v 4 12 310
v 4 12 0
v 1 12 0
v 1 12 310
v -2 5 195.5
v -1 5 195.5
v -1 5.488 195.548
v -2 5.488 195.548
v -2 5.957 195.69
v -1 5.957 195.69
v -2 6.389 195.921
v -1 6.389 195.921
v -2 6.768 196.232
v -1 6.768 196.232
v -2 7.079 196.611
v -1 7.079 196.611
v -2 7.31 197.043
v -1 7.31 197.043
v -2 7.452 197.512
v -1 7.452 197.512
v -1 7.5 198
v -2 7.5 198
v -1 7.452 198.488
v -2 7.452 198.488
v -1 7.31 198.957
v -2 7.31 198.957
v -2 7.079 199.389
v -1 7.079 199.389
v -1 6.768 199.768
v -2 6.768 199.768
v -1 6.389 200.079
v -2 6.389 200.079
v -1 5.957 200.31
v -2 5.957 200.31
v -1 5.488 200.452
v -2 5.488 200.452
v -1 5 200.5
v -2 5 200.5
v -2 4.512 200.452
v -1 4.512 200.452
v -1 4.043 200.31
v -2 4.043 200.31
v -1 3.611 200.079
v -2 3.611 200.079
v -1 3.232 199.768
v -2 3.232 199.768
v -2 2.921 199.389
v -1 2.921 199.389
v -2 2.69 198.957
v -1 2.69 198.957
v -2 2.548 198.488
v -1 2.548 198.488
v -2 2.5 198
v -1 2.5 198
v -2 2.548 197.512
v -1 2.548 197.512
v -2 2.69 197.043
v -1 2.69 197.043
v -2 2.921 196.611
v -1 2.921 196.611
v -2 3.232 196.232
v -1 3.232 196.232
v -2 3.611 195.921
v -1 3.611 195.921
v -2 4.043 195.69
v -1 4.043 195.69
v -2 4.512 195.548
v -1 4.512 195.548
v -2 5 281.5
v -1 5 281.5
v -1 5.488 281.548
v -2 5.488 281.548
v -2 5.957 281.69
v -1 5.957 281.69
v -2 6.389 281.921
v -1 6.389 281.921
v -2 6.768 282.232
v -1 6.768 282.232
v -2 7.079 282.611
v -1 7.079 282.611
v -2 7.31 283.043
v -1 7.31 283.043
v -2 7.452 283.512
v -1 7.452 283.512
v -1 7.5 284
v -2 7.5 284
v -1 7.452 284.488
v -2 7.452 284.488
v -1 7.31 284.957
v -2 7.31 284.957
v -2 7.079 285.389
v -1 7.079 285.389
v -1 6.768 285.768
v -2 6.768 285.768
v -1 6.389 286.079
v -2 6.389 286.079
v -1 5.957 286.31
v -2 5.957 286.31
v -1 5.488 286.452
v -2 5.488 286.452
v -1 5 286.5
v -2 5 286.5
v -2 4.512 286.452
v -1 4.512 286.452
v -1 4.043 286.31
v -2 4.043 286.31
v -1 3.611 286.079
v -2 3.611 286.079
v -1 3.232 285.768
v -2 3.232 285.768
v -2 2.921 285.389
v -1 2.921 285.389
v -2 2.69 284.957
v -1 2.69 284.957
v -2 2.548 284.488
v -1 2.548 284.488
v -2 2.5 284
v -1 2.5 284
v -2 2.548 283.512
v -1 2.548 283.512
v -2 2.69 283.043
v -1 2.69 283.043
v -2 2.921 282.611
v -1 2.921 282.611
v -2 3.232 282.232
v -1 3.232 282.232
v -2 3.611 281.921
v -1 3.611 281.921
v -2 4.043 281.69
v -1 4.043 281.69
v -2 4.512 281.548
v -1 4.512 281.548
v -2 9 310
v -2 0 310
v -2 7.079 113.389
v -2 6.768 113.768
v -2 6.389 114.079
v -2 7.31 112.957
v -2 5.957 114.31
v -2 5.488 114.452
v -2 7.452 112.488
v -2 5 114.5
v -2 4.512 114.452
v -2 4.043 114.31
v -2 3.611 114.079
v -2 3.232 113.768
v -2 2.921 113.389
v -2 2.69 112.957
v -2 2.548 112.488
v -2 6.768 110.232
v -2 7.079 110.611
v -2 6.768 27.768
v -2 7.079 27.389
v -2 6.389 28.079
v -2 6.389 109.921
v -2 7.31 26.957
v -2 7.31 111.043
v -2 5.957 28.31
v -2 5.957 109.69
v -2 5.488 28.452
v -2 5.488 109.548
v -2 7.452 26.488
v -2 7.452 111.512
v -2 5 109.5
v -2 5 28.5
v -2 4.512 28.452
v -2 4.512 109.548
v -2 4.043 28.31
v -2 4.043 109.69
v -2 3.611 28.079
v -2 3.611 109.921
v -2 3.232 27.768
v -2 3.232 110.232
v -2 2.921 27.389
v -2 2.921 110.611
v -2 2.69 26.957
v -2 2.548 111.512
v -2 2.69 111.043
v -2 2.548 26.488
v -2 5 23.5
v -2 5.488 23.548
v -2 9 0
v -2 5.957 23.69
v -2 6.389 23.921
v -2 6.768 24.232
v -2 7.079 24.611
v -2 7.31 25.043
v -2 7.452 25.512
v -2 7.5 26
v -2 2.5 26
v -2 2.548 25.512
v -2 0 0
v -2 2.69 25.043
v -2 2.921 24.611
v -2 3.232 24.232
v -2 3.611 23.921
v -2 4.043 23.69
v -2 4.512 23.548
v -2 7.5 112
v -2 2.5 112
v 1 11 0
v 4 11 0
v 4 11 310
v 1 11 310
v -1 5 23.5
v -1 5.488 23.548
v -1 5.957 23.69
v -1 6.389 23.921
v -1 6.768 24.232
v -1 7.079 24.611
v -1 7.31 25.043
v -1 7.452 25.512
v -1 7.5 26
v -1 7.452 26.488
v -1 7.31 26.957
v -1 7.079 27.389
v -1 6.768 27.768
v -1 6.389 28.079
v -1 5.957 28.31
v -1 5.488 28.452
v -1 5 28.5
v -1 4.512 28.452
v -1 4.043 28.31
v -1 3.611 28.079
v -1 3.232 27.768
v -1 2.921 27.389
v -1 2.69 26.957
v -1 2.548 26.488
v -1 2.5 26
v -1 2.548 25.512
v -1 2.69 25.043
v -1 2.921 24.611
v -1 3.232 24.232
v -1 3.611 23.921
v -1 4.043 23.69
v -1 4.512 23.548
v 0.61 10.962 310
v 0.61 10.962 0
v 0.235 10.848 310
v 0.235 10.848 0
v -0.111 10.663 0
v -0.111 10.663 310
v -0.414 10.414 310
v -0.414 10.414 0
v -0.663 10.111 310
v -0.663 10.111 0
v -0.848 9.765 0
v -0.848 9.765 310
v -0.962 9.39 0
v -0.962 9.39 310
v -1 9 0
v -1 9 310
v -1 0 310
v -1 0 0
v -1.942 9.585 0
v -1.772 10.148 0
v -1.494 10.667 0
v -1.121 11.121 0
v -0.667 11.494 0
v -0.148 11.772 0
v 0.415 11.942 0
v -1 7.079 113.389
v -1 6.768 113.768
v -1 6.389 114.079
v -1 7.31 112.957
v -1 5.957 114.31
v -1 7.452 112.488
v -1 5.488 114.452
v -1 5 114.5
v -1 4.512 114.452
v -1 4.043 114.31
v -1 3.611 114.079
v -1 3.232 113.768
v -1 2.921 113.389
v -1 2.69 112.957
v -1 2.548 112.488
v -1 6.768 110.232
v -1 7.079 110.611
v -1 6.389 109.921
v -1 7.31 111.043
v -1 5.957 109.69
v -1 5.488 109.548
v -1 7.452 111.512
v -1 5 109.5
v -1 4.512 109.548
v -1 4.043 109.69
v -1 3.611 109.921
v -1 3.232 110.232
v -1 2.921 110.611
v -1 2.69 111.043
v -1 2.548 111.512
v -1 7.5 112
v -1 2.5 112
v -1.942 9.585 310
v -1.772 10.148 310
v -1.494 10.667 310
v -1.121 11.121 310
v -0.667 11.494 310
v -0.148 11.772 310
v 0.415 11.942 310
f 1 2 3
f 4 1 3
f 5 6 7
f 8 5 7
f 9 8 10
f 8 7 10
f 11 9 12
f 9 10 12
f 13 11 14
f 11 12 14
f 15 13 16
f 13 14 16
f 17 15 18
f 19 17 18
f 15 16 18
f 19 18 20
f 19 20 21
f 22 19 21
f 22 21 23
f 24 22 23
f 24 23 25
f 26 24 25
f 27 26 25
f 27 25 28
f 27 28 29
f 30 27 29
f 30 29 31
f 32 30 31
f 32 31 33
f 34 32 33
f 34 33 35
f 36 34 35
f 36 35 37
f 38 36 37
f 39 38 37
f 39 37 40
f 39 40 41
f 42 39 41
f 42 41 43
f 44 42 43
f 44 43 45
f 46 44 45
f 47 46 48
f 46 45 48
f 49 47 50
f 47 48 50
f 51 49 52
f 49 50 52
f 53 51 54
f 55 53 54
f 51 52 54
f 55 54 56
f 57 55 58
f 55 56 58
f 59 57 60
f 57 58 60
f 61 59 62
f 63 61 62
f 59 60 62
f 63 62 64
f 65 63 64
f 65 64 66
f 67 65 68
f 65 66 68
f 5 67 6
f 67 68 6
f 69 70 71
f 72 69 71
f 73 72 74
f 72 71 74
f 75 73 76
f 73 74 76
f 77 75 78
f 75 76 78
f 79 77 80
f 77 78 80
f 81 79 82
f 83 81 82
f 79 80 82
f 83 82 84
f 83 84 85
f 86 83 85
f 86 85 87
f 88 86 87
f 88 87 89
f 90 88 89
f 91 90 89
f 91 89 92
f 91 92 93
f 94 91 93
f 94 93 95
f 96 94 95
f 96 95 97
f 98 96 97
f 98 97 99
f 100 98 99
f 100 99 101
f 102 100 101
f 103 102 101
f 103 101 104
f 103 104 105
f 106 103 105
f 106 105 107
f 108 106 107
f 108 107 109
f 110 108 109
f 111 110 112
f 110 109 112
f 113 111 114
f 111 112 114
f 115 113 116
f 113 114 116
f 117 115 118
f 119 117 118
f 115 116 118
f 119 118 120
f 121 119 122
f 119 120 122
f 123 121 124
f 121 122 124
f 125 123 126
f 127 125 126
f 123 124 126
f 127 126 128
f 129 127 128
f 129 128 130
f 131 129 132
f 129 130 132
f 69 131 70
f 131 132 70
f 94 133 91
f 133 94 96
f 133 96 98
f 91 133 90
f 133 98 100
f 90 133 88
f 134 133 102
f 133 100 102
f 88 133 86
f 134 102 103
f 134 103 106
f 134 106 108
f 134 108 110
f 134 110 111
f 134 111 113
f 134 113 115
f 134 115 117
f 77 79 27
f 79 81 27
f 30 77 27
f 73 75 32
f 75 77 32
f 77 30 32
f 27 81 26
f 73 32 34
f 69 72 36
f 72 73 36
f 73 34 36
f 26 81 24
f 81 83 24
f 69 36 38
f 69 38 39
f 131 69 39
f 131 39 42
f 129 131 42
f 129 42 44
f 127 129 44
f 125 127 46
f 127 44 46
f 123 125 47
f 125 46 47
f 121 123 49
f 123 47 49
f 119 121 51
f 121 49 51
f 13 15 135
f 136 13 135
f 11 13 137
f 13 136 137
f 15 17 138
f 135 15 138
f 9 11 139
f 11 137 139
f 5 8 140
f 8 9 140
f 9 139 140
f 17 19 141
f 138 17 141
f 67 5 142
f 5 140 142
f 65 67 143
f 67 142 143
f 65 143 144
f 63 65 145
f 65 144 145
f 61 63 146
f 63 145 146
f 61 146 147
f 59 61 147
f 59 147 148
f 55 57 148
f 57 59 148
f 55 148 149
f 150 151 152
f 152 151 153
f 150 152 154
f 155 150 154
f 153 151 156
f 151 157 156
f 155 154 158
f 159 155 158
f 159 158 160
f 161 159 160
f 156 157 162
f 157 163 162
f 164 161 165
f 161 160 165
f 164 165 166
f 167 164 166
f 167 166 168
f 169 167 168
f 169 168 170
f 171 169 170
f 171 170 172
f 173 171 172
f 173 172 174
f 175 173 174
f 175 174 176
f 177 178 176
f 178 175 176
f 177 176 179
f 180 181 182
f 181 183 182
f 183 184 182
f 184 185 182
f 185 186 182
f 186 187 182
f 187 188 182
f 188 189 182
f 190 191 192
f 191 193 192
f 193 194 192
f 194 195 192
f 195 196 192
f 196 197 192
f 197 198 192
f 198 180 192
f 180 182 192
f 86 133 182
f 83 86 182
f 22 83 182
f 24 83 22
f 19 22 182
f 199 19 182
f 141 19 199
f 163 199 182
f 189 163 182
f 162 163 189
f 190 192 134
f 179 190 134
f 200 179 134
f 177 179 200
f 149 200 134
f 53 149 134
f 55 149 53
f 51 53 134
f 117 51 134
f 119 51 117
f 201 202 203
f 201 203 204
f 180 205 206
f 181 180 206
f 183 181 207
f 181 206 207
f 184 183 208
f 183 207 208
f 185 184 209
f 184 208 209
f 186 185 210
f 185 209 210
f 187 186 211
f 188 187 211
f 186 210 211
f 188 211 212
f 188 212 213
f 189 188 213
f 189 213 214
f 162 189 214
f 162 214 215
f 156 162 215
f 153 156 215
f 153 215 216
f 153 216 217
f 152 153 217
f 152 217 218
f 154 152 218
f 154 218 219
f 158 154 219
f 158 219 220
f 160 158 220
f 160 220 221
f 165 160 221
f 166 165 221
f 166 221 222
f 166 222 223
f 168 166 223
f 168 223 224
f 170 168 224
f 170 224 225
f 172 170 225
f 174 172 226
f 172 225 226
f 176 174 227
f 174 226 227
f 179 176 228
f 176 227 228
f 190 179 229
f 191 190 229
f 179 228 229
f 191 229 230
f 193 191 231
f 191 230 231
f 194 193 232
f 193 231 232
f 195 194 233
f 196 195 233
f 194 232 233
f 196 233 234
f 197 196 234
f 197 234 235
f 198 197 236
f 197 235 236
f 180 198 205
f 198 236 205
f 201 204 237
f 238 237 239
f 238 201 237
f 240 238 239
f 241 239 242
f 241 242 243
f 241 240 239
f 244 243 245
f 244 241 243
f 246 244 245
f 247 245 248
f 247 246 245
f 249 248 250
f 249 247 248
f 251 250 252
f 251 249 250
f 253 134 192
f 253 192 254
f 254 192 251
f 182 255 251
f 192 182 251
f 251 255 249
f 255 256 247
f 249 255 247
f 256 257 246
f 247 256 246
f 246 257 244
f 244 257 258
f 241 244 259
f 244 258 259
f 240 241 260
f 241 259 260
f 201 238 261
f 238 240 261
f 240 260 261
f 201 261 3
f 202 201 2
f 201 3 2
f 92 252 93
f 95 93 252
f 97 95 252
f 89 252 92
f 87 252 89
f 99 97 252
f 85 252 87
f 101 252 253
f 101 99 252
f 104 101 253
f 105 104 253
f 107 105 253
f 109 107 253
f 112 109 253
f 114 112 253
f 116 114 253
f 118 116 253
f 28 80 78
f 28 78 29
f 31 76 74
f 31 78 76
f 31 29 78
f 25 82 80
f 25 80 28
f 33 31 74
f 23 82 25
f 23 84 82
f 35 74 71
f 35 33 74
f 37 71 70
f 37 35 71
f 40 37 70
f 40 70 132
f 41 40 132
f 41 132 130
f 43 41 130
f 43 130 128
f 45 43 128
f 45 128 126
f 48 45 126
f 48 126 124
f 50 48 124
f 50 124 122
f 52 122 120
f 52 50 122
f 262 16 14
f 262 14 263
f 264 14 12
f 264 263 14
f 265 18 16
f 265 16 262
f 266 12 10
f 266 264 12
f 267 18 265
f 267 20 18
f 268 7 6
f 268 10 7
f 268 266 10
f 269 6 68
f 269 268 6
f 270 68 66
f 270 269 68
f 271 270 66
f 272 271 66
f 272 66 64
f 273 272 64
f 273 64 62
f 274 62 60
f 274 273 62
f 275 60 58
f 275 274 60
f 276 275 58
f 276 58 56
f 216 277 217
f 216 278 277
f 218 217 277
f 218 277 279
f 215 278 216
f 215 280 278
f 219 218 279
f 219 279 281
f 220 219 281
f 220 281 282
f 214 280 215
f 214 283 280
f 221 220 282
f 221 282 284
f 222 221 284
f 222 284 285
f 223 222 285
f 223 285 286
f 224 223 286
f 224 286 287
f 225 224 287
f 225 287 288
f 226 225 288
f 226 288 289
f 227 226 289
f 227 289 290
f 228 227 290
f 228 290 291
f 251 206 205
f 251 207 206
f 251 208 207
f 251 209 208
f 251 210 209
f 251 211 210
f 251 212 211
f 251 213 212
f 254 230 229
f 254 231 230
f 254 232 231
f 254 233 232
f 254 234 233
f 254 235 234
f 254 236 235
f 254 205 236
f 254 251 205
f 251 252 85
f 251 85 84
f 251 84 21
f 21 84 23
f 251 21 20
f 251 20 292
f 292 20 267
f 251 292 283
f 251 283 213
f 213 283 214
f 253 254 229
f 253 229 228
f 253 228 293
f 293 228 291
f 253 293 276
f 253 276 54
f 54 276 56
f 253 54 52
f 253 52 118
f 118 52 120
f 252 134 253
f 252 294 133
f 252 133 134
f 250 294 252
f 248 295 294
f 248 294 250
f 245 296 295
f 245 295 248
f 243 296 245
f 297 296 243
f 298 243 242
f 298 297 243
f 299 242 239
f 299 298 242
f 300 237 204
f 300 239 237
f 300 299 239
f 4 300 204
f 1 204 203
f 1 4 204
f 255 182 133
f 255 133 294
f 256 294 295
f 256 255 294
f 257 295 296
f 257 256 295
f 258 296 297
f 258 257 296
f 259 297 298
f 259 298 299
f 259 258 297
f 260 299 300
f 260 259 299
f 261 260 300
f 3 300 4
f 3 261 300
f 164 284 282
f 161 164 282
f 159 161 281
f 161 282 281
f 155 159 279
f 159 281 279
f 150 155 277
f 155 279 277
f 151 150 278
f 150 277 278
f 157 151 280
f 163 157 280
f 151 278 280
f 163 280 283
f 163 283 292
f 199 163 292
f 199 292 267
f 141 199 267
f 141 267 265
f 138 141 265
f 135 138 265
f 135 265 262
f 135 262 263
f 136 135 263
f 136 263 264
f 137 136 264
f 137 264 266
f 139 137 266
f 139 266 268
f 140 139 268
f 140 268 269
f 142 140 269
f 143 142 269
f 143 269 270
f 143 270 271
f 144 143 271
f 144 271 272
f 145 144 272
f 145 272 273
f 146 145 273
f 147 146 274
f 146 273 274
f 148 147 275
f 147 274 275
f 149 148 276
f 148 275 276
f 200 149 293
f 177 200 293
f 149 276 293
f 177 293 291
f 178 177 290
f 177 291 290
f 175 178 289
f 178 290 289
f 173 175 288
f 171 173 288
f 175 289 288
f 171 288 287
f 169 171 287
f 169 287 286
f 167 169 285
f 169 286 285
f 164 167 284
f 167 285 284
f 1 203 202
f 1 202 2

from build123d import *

# Parameters (mm, degrees)
BOSS_EXTRUDE1_DEPTH  = 310
SKETCH2_R            = 2.5
CUT_EXTRUDE1_DEPTH   = 311.25795719
CONVERT_SOLID2_DEPTH = 310


# Read off the part's stored shape, not the designer's step: Convert-Solid2
with BuildPart() as part:
    # Sketch1 → Boss-Extrude1 (new body)
    with BuildSketch(Plane.XY):
        Polygon((0, 0), (0, 10), (4, 10), (4, 12), (-2, 12), (-2, 0), align=None)
    extrude(amount=BOSS_EXTRUDE1_DEPTH)

    # Sketch2 → Cut-Extrude1 (cut, through all)
    with BuildSketch(Plane(origin=(0, 0, 0), x_dir=(0, 0, -1), z_dir=(1, 0, 0))):
        with Locations((-284, 5)):
            Circle(SKETCH2_R)
        with Locations((-198, 5)):
            Circle(SKETCH2_R)
        with Locations((-112, 5)):
            Circle(SKETCH2_R)
        with Locations((-26, 5)):
            Circle(SKETCH2_R)
    extrude(amount=-CUT_EXTRUDE1_DEPTH, mode=Mode.SUBTRACT)

    # Convert-Solid2 outline → Convert-Solid2 (cut)
    with BuildSketch(Plane.XY):
        with BuildLine():
            Line((-2, 12), (-2, 9))
            ThreePointArc((-2, 9), (-1.121320344, 11.121320344), (1, 12))
            Line((1, 12), (-2, 12))
        make_face()
        with BuildLine():
            Line((-1, 9), (-1, 0))
            Line((-1, 0), (0, 0))
            Line((0, 0), (0, 10))
            Line((0, 10), (4, 10))
            Line((4, 10), (4, 11))
            Line((4, 11), (1, 11))
            ThreePointArc((1, 11), (-0.414213562, 10.414213562), (-1, 9))
        make_face()
    extrude(amount=CONVERT_SOLID2_DEPTH, mode=Mode.SUBTRACT)


solid = part.part
